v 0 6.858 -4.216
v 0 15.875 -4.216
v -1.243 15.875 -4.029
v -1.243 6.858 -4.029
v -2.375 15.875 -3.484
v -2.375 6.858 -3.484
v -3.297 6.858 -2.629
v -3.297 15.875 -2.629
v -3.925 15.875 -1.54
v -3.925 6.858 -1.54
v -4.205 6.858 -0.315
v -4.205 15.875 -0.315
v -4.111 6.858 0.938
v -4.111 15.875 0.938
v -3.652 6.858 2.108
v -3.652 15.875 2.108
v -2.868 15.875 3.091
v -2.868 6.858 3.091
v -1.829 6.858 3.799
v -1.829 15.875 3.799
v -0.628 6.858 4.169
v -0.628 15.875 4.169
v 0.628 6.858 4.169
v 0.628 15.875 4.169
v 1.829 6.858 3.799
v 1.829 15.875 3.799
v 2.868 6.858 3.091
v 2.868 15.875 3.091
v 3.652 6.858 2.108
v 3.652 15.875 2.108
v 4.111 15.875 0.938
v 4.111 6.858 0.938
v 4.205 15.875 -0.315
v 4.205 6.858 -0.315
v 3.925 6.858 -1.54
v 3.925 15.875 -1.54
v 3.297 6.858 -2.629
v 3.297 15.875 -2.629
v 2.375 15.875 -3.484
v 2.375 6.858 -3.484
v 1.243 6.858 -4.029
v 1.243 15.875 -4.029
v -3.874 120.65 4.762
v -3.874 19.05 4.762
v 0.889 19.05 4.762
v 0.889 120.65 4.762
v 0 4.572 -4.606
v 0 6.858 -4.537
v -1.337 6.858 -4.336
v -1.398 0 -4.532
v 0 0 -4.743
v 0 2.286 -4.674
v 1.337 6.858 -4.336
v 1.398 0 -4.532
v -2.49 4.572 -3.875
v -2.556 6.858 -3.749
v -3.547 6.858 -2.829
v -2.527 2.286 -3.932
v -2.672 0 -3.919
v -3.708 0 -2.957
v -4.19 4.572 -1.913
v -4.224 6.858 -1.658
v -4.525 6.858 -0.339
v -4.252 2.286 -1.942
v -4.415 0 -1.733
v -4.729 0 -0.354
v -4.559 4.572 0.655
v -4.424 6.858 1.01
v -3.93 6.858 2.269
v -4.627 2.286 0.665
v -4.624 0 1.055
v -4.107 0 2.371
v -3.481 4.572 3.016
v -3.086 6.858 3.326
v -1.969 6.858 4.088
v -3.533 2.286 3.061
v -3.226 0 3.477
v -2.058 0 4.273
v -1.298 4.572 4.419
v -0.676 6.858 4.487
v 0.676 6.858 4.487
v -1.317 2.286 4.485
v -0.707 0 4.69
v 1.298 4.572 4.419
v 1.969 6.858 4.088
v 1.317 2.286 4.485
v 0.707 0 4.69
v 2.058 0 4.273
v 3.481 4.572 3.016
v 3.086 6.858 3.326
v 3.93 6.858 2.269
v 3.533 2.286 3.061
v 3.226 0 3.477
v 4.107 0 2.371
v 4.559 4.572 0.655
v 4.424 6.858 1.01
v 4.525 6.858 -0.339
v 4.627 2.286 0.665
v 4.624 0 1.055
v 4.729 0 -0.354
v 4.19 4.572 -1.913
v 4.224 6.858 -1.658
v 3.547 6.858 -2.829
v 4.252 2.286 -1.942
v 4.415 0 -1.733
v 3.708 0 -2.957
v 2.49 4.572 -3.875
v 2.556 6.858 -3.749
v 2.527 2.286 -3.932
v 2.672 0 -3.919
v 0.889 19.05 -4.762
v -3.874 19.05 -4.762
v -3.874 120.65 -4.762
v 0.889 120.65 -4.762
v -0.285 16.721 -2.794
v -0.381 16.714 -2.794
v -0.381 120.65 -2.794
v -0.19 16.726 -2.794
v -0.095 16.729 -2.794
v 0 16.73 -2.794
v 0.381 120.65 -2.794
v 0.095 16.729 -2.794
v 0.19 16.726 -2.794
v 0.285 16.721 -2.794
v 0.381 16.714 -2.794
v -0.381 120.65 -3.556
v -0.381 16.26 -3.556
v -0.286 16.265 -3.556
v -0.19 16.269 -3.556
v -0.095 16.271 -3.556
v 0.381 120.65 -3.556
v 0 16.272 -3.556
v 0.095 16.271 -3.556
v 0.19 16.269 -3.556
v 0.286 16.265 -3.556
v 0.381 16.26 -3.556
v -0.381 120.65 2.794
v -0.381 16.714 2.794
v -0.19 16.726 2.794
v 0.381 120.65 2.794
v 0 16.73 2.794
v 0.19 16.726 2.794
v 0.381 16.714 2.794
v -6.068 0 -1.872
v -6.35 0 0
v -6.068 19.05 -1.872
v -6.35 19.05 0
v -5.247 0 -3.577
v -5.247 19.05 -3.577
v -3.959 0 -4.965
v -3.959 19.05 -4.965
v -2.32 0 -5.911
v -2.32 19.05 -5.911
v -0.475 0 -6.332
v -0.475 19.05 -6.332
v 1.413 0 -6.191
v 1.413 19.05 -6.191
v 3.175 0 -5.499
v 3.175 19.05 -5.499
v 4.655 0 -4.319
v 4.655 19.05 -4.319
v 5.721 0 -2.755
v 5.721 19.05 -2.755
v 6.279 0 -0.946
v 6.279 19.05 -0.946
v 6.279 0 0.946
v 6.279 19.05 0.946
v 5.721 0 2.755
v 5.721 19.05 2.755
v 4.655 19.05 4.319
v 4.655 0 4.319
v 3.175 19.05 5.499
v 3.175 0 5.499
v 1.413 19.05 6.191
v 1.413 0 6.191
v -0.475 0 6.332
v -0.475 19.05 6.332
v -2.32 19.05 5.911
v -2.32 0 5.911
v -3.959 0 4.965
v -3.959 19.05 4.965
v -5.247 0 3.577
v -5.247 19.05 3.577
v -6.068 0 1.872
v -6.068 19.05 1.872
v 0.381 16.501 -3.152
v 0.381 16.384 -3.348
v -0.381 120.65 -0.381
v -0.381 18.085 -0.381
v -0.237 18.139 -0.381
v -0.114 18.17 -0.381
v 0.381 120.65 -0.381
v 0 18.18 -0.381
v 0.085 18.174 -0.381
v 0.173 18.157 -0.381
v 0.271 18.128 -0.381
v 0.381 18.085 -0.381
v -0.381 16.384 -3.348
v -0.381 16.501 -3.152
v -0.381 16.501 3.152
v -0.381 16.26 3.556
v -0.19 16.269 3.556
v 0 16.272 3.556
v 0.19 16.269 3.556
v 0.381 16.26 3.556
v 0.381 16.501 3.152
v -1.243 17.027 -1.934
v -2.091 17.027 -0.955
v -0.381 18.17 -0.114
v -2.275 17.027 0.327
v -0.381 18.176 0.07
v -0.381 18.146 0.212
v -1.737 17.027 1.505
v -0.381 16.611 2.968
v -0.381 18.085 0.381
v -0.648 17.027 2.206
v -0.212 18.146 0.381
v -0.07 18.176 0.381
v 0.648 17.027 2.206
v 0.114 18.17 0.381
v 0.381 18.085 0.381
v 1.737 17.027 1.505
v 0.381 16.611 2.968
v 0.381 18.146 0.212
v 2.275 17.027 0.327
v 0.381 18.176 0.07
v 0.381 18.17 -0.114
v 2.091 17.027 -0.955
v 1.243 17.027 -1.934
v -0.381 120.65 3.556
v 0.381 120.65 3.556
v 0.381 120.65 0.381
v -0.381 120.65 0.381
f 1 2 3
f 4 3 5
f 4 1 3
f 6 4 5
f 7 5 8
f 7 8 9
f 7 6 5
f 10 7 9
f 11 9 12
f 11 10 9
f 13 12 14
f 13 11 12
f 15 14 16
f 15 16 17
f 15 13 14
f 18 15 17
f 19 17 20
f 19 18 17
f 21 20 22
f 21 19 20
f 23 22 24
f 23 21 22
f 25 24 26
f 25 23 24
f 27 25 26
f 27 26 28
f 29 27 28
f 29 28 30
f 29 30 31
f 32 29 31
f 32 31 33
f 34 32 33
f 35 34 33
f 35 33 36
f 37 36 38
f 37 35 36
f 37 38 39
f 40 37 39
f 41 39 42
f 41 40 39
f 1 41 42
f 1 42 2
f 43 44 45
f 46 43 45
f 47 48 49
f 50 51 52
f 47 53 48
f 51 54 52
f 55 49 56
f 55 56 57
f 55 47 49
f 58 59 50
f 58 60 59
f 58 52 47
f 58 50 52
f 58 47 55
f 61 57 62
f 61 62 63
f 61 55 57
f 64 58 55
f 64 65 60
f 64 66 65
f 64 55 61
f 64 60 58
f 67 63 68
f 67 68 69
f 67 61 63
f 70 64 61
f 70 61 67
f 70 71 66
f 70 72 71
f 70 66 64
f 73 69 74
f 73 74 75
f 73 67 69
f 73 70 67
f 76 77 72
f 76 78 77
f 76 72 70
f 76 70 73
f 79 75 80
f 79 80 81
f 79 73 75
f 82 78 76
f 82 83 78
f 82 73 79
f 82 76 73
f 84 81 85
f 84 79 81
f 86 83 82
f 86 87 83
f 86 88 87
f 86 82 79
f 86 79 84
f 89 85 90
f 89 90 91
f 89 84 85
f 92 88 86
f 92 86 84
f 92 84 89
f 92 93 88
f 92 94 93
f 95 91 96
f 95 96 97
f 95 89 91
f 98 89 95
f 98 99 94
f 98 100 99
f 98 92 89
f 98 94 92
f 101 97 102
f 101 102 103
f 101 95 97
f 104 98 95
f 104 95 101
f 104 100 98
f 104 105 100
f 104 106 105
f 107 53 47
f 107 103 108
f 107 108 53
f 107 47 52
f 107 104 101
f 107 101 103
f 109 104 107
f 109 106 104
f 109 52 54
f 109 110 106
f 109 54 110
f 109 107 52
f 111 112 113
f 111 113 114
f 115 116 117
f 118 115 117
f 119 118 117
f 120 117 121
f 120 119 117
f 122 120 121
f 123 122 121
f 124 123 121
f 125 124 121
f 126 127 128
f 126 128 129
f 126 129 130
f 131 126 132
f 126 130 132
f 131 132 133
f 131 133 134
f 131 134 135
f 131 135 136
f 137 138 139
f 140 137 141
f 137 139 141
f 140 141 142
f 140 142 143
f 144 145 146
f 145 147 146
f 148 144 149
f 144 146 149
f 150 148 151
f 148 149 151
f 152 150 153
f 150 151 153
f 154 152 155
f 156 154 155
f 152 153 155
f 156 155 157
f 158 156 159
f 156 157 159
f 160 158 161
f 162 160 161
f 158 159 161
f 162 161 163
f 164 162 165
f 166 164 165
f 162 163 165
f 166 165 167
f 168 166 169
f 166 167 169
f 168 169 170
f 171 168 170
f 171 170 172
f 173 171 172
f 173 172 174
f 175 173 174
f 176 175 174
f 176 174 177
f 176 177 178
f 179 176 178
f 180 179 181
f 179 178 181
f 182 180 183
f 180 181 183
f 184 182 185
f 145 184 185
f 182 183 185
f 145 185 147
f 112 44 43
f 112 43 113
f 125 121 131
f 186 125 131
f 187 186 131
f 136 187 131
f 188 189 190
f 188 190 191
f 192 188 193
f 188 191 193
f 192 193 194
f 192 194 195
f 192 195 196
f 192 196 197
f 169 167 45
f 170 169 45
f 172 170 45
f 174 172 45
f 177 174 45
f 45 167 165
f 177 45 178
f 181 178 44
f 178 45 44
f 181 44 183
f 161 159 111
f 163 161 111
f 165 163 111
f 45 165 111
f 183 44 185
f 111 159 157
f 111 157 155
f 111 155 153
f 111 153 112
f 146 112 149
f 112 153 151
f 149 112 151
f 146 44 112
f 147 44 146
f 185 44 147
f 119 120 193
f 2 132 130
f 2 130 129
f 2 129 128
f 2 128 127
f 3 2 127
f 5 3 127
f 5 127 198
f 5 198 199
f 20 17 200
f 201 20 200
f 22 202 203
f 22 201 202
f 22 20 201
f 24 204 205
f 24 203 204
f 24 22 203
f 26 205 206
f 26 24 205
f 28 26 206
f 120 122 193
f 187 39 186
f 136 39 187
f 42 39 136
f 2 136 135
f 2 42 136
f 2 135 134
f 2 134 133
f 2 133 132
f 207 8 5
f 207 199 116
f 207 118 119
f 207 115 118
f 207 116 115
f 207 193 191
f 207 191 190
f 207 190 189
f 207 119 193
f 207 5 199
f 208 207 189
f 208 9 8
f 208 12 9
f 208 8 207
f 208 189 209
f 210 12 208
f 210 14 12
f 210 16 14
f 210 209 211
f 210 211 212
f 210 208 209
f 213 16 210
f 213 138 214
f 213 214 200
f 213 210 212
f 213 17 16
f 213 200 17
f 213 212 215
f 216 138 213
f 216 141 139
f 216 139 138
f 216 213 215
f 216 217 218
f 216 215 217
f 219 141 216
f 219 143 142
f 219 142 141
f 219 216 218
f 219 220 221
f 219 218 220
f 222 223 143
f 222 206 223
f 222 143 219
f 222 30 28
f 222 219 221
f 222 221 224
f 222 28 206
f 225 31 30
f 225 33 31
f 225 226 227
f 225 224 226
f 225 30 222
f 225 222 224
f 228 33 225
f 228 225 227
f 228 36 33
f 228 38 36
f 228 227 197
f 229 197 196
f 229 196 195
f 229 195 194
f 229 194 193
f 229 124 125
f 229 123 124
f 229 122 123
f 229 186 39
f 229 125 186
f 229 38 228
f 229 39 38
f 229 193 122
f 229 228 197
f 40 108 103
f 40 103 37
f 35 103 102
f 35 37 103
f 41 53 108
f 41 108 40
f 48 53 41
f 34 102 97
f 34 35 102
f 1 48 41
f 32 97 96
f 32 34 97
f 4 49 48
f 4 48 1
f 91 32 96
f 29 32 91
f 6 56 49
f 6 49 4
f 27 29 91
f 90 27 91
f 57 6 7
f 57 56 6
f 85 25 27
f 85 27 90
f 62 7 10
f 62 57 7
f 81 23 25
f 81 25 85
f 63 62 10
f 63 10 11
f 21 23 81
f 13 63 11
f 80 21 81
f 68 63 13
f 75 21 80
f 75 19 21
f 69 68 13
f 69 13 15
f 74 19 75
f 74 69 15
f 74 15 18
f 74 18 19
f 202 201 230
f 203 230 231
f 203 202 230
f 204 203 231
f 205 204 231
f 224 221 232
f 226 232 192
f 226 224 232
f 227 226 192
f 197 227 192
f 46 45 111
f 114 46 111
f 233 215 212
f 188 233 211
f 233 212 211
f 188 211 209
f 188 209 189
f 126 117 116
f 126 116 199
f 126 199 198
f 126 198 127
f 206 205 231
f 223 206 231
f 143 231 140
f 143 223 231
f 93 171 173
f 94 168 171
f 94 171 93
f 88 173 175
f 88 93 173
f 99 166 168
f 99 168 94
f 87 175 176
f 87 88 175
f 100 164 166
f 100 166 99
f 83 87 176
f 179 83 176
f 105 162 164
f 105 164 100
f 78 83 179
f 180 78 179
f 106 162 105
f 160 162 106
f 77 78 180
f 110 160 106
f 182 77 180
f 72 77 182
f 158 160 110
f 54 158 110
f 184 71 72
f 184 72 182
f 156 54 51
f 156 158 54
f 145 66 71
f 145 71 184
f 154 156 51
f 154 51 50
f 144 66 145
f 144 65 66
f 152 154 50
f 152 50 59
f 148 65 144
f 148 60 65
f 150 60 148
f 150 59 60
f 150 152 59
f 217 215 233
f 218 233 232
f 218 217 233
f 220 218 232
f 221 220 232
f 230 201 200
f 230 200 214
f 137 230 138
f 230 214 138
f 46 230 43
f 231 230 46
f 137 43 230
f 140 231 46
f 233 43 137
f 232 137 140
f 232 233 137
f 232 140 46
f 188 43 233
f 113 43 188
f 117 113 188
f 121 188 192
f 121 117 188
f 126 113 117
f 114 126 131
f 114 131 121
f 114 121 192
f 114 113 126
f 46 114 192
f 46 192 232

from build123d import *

# Parameters (mm, degrees)
SKETCH1_W            = 6.35
SKETCH1_H            = 19.05
SKETCH2_W            = 4.7625
SKETCH2_H            = 3.175
SKETCH2_W_2          = 0.762
SKETCH2_H_2          = 0.762
BOSS_EXTRUDE1_DEPTH  = 101.6
SKETCH6_W            = 0.762
SKETCH6_H            = 0.762
CUT_EXTRUDE2_DEPTH   = 6.35
LPATTERN1_COUNT      = 2
LPATTERN1_PITCH      = 3.175
LPATTERN1_COUNT_DIR2 = 2
LPATTERN1_PITCH_DIR2 = 3.175


with BuildPart() as part:
    # Sketch1 → Revolve1 (revolve)
    with BuildSketch(Plane.XY):
        with Locations((-3.175, 9.525)):
            Rectangle(SKETCH1_W, SKETCH1_H)
    revolve(axis=Axis((0, 19.05, 0), (0, -1, 0)))

    # Sketch2 → Boss-Extrude1 (add)
    with BuildSketch(Plane(origin=(0, 19.05, 0), x_dir=(1, 0, 0), z_dir=(0, 1, 0))):
        with Locations((-1.49225, 0)):
            Rectangle(SKETCH2_W, SKETCH2_H)
        Rectangle(SKETCH2_W_2, SKETCH2_H_2, mode=Mode.SUBTRACT)
    boss_extrude1 = extrude(amount=BOSS_EXTRUDE1_DEPTH)

    # Sketch6 → Cut-Extrude2 (cut)
    with BuildSketch(Plane(origin=(0, 19.05, 0), x_dir=(1, 0, 0), z_dir=(0, 1, 0))):
        Rectangle(SKETCH6_W, SKETCH6_H)
    cut_extrude2 = extrude(amount=-CUT_EXTRUDE2_DEPTH, mode=Mode.SUBTRACT)

    # LPattern1: Boss-Extrude1, Cut-Extrude2 2 × 2
    with Locations(*[Vector(0, 0, -1) * (i * LPATTERN1_PITCH) + Vector(0, 0, 1) * (j * LPATTERN1_PITCH_DIR2) for i in range(LPATTERN1_COUNT) for j in range(LPATTERN1_COUNT_DIR2) if (i, j) != (0, 0)]):
        add(boss_extrude1)
        add(cut_extrude2, mode=Mode.SUBTRACT)

    # Sketch4 → 1/8 NPT Tapped Hole1 (revolve, cut)
    with BuildSketch(Plane(origin=(0, 0, 0), x_dir=(0, 0, -1), z_dir=(1, 0, 0))):
        Polygon((0, 0), (0, 18.408468714), (4.2164, 15.875), (4.2164, 6.858), (4.537401096, 6.858), (4.7427388, 0), align=None)
    revolve(axis=Axis((0, -6.35, 0), (0, 1, 0)), mode=Mode.SUBTRACT)


solid = part.part
